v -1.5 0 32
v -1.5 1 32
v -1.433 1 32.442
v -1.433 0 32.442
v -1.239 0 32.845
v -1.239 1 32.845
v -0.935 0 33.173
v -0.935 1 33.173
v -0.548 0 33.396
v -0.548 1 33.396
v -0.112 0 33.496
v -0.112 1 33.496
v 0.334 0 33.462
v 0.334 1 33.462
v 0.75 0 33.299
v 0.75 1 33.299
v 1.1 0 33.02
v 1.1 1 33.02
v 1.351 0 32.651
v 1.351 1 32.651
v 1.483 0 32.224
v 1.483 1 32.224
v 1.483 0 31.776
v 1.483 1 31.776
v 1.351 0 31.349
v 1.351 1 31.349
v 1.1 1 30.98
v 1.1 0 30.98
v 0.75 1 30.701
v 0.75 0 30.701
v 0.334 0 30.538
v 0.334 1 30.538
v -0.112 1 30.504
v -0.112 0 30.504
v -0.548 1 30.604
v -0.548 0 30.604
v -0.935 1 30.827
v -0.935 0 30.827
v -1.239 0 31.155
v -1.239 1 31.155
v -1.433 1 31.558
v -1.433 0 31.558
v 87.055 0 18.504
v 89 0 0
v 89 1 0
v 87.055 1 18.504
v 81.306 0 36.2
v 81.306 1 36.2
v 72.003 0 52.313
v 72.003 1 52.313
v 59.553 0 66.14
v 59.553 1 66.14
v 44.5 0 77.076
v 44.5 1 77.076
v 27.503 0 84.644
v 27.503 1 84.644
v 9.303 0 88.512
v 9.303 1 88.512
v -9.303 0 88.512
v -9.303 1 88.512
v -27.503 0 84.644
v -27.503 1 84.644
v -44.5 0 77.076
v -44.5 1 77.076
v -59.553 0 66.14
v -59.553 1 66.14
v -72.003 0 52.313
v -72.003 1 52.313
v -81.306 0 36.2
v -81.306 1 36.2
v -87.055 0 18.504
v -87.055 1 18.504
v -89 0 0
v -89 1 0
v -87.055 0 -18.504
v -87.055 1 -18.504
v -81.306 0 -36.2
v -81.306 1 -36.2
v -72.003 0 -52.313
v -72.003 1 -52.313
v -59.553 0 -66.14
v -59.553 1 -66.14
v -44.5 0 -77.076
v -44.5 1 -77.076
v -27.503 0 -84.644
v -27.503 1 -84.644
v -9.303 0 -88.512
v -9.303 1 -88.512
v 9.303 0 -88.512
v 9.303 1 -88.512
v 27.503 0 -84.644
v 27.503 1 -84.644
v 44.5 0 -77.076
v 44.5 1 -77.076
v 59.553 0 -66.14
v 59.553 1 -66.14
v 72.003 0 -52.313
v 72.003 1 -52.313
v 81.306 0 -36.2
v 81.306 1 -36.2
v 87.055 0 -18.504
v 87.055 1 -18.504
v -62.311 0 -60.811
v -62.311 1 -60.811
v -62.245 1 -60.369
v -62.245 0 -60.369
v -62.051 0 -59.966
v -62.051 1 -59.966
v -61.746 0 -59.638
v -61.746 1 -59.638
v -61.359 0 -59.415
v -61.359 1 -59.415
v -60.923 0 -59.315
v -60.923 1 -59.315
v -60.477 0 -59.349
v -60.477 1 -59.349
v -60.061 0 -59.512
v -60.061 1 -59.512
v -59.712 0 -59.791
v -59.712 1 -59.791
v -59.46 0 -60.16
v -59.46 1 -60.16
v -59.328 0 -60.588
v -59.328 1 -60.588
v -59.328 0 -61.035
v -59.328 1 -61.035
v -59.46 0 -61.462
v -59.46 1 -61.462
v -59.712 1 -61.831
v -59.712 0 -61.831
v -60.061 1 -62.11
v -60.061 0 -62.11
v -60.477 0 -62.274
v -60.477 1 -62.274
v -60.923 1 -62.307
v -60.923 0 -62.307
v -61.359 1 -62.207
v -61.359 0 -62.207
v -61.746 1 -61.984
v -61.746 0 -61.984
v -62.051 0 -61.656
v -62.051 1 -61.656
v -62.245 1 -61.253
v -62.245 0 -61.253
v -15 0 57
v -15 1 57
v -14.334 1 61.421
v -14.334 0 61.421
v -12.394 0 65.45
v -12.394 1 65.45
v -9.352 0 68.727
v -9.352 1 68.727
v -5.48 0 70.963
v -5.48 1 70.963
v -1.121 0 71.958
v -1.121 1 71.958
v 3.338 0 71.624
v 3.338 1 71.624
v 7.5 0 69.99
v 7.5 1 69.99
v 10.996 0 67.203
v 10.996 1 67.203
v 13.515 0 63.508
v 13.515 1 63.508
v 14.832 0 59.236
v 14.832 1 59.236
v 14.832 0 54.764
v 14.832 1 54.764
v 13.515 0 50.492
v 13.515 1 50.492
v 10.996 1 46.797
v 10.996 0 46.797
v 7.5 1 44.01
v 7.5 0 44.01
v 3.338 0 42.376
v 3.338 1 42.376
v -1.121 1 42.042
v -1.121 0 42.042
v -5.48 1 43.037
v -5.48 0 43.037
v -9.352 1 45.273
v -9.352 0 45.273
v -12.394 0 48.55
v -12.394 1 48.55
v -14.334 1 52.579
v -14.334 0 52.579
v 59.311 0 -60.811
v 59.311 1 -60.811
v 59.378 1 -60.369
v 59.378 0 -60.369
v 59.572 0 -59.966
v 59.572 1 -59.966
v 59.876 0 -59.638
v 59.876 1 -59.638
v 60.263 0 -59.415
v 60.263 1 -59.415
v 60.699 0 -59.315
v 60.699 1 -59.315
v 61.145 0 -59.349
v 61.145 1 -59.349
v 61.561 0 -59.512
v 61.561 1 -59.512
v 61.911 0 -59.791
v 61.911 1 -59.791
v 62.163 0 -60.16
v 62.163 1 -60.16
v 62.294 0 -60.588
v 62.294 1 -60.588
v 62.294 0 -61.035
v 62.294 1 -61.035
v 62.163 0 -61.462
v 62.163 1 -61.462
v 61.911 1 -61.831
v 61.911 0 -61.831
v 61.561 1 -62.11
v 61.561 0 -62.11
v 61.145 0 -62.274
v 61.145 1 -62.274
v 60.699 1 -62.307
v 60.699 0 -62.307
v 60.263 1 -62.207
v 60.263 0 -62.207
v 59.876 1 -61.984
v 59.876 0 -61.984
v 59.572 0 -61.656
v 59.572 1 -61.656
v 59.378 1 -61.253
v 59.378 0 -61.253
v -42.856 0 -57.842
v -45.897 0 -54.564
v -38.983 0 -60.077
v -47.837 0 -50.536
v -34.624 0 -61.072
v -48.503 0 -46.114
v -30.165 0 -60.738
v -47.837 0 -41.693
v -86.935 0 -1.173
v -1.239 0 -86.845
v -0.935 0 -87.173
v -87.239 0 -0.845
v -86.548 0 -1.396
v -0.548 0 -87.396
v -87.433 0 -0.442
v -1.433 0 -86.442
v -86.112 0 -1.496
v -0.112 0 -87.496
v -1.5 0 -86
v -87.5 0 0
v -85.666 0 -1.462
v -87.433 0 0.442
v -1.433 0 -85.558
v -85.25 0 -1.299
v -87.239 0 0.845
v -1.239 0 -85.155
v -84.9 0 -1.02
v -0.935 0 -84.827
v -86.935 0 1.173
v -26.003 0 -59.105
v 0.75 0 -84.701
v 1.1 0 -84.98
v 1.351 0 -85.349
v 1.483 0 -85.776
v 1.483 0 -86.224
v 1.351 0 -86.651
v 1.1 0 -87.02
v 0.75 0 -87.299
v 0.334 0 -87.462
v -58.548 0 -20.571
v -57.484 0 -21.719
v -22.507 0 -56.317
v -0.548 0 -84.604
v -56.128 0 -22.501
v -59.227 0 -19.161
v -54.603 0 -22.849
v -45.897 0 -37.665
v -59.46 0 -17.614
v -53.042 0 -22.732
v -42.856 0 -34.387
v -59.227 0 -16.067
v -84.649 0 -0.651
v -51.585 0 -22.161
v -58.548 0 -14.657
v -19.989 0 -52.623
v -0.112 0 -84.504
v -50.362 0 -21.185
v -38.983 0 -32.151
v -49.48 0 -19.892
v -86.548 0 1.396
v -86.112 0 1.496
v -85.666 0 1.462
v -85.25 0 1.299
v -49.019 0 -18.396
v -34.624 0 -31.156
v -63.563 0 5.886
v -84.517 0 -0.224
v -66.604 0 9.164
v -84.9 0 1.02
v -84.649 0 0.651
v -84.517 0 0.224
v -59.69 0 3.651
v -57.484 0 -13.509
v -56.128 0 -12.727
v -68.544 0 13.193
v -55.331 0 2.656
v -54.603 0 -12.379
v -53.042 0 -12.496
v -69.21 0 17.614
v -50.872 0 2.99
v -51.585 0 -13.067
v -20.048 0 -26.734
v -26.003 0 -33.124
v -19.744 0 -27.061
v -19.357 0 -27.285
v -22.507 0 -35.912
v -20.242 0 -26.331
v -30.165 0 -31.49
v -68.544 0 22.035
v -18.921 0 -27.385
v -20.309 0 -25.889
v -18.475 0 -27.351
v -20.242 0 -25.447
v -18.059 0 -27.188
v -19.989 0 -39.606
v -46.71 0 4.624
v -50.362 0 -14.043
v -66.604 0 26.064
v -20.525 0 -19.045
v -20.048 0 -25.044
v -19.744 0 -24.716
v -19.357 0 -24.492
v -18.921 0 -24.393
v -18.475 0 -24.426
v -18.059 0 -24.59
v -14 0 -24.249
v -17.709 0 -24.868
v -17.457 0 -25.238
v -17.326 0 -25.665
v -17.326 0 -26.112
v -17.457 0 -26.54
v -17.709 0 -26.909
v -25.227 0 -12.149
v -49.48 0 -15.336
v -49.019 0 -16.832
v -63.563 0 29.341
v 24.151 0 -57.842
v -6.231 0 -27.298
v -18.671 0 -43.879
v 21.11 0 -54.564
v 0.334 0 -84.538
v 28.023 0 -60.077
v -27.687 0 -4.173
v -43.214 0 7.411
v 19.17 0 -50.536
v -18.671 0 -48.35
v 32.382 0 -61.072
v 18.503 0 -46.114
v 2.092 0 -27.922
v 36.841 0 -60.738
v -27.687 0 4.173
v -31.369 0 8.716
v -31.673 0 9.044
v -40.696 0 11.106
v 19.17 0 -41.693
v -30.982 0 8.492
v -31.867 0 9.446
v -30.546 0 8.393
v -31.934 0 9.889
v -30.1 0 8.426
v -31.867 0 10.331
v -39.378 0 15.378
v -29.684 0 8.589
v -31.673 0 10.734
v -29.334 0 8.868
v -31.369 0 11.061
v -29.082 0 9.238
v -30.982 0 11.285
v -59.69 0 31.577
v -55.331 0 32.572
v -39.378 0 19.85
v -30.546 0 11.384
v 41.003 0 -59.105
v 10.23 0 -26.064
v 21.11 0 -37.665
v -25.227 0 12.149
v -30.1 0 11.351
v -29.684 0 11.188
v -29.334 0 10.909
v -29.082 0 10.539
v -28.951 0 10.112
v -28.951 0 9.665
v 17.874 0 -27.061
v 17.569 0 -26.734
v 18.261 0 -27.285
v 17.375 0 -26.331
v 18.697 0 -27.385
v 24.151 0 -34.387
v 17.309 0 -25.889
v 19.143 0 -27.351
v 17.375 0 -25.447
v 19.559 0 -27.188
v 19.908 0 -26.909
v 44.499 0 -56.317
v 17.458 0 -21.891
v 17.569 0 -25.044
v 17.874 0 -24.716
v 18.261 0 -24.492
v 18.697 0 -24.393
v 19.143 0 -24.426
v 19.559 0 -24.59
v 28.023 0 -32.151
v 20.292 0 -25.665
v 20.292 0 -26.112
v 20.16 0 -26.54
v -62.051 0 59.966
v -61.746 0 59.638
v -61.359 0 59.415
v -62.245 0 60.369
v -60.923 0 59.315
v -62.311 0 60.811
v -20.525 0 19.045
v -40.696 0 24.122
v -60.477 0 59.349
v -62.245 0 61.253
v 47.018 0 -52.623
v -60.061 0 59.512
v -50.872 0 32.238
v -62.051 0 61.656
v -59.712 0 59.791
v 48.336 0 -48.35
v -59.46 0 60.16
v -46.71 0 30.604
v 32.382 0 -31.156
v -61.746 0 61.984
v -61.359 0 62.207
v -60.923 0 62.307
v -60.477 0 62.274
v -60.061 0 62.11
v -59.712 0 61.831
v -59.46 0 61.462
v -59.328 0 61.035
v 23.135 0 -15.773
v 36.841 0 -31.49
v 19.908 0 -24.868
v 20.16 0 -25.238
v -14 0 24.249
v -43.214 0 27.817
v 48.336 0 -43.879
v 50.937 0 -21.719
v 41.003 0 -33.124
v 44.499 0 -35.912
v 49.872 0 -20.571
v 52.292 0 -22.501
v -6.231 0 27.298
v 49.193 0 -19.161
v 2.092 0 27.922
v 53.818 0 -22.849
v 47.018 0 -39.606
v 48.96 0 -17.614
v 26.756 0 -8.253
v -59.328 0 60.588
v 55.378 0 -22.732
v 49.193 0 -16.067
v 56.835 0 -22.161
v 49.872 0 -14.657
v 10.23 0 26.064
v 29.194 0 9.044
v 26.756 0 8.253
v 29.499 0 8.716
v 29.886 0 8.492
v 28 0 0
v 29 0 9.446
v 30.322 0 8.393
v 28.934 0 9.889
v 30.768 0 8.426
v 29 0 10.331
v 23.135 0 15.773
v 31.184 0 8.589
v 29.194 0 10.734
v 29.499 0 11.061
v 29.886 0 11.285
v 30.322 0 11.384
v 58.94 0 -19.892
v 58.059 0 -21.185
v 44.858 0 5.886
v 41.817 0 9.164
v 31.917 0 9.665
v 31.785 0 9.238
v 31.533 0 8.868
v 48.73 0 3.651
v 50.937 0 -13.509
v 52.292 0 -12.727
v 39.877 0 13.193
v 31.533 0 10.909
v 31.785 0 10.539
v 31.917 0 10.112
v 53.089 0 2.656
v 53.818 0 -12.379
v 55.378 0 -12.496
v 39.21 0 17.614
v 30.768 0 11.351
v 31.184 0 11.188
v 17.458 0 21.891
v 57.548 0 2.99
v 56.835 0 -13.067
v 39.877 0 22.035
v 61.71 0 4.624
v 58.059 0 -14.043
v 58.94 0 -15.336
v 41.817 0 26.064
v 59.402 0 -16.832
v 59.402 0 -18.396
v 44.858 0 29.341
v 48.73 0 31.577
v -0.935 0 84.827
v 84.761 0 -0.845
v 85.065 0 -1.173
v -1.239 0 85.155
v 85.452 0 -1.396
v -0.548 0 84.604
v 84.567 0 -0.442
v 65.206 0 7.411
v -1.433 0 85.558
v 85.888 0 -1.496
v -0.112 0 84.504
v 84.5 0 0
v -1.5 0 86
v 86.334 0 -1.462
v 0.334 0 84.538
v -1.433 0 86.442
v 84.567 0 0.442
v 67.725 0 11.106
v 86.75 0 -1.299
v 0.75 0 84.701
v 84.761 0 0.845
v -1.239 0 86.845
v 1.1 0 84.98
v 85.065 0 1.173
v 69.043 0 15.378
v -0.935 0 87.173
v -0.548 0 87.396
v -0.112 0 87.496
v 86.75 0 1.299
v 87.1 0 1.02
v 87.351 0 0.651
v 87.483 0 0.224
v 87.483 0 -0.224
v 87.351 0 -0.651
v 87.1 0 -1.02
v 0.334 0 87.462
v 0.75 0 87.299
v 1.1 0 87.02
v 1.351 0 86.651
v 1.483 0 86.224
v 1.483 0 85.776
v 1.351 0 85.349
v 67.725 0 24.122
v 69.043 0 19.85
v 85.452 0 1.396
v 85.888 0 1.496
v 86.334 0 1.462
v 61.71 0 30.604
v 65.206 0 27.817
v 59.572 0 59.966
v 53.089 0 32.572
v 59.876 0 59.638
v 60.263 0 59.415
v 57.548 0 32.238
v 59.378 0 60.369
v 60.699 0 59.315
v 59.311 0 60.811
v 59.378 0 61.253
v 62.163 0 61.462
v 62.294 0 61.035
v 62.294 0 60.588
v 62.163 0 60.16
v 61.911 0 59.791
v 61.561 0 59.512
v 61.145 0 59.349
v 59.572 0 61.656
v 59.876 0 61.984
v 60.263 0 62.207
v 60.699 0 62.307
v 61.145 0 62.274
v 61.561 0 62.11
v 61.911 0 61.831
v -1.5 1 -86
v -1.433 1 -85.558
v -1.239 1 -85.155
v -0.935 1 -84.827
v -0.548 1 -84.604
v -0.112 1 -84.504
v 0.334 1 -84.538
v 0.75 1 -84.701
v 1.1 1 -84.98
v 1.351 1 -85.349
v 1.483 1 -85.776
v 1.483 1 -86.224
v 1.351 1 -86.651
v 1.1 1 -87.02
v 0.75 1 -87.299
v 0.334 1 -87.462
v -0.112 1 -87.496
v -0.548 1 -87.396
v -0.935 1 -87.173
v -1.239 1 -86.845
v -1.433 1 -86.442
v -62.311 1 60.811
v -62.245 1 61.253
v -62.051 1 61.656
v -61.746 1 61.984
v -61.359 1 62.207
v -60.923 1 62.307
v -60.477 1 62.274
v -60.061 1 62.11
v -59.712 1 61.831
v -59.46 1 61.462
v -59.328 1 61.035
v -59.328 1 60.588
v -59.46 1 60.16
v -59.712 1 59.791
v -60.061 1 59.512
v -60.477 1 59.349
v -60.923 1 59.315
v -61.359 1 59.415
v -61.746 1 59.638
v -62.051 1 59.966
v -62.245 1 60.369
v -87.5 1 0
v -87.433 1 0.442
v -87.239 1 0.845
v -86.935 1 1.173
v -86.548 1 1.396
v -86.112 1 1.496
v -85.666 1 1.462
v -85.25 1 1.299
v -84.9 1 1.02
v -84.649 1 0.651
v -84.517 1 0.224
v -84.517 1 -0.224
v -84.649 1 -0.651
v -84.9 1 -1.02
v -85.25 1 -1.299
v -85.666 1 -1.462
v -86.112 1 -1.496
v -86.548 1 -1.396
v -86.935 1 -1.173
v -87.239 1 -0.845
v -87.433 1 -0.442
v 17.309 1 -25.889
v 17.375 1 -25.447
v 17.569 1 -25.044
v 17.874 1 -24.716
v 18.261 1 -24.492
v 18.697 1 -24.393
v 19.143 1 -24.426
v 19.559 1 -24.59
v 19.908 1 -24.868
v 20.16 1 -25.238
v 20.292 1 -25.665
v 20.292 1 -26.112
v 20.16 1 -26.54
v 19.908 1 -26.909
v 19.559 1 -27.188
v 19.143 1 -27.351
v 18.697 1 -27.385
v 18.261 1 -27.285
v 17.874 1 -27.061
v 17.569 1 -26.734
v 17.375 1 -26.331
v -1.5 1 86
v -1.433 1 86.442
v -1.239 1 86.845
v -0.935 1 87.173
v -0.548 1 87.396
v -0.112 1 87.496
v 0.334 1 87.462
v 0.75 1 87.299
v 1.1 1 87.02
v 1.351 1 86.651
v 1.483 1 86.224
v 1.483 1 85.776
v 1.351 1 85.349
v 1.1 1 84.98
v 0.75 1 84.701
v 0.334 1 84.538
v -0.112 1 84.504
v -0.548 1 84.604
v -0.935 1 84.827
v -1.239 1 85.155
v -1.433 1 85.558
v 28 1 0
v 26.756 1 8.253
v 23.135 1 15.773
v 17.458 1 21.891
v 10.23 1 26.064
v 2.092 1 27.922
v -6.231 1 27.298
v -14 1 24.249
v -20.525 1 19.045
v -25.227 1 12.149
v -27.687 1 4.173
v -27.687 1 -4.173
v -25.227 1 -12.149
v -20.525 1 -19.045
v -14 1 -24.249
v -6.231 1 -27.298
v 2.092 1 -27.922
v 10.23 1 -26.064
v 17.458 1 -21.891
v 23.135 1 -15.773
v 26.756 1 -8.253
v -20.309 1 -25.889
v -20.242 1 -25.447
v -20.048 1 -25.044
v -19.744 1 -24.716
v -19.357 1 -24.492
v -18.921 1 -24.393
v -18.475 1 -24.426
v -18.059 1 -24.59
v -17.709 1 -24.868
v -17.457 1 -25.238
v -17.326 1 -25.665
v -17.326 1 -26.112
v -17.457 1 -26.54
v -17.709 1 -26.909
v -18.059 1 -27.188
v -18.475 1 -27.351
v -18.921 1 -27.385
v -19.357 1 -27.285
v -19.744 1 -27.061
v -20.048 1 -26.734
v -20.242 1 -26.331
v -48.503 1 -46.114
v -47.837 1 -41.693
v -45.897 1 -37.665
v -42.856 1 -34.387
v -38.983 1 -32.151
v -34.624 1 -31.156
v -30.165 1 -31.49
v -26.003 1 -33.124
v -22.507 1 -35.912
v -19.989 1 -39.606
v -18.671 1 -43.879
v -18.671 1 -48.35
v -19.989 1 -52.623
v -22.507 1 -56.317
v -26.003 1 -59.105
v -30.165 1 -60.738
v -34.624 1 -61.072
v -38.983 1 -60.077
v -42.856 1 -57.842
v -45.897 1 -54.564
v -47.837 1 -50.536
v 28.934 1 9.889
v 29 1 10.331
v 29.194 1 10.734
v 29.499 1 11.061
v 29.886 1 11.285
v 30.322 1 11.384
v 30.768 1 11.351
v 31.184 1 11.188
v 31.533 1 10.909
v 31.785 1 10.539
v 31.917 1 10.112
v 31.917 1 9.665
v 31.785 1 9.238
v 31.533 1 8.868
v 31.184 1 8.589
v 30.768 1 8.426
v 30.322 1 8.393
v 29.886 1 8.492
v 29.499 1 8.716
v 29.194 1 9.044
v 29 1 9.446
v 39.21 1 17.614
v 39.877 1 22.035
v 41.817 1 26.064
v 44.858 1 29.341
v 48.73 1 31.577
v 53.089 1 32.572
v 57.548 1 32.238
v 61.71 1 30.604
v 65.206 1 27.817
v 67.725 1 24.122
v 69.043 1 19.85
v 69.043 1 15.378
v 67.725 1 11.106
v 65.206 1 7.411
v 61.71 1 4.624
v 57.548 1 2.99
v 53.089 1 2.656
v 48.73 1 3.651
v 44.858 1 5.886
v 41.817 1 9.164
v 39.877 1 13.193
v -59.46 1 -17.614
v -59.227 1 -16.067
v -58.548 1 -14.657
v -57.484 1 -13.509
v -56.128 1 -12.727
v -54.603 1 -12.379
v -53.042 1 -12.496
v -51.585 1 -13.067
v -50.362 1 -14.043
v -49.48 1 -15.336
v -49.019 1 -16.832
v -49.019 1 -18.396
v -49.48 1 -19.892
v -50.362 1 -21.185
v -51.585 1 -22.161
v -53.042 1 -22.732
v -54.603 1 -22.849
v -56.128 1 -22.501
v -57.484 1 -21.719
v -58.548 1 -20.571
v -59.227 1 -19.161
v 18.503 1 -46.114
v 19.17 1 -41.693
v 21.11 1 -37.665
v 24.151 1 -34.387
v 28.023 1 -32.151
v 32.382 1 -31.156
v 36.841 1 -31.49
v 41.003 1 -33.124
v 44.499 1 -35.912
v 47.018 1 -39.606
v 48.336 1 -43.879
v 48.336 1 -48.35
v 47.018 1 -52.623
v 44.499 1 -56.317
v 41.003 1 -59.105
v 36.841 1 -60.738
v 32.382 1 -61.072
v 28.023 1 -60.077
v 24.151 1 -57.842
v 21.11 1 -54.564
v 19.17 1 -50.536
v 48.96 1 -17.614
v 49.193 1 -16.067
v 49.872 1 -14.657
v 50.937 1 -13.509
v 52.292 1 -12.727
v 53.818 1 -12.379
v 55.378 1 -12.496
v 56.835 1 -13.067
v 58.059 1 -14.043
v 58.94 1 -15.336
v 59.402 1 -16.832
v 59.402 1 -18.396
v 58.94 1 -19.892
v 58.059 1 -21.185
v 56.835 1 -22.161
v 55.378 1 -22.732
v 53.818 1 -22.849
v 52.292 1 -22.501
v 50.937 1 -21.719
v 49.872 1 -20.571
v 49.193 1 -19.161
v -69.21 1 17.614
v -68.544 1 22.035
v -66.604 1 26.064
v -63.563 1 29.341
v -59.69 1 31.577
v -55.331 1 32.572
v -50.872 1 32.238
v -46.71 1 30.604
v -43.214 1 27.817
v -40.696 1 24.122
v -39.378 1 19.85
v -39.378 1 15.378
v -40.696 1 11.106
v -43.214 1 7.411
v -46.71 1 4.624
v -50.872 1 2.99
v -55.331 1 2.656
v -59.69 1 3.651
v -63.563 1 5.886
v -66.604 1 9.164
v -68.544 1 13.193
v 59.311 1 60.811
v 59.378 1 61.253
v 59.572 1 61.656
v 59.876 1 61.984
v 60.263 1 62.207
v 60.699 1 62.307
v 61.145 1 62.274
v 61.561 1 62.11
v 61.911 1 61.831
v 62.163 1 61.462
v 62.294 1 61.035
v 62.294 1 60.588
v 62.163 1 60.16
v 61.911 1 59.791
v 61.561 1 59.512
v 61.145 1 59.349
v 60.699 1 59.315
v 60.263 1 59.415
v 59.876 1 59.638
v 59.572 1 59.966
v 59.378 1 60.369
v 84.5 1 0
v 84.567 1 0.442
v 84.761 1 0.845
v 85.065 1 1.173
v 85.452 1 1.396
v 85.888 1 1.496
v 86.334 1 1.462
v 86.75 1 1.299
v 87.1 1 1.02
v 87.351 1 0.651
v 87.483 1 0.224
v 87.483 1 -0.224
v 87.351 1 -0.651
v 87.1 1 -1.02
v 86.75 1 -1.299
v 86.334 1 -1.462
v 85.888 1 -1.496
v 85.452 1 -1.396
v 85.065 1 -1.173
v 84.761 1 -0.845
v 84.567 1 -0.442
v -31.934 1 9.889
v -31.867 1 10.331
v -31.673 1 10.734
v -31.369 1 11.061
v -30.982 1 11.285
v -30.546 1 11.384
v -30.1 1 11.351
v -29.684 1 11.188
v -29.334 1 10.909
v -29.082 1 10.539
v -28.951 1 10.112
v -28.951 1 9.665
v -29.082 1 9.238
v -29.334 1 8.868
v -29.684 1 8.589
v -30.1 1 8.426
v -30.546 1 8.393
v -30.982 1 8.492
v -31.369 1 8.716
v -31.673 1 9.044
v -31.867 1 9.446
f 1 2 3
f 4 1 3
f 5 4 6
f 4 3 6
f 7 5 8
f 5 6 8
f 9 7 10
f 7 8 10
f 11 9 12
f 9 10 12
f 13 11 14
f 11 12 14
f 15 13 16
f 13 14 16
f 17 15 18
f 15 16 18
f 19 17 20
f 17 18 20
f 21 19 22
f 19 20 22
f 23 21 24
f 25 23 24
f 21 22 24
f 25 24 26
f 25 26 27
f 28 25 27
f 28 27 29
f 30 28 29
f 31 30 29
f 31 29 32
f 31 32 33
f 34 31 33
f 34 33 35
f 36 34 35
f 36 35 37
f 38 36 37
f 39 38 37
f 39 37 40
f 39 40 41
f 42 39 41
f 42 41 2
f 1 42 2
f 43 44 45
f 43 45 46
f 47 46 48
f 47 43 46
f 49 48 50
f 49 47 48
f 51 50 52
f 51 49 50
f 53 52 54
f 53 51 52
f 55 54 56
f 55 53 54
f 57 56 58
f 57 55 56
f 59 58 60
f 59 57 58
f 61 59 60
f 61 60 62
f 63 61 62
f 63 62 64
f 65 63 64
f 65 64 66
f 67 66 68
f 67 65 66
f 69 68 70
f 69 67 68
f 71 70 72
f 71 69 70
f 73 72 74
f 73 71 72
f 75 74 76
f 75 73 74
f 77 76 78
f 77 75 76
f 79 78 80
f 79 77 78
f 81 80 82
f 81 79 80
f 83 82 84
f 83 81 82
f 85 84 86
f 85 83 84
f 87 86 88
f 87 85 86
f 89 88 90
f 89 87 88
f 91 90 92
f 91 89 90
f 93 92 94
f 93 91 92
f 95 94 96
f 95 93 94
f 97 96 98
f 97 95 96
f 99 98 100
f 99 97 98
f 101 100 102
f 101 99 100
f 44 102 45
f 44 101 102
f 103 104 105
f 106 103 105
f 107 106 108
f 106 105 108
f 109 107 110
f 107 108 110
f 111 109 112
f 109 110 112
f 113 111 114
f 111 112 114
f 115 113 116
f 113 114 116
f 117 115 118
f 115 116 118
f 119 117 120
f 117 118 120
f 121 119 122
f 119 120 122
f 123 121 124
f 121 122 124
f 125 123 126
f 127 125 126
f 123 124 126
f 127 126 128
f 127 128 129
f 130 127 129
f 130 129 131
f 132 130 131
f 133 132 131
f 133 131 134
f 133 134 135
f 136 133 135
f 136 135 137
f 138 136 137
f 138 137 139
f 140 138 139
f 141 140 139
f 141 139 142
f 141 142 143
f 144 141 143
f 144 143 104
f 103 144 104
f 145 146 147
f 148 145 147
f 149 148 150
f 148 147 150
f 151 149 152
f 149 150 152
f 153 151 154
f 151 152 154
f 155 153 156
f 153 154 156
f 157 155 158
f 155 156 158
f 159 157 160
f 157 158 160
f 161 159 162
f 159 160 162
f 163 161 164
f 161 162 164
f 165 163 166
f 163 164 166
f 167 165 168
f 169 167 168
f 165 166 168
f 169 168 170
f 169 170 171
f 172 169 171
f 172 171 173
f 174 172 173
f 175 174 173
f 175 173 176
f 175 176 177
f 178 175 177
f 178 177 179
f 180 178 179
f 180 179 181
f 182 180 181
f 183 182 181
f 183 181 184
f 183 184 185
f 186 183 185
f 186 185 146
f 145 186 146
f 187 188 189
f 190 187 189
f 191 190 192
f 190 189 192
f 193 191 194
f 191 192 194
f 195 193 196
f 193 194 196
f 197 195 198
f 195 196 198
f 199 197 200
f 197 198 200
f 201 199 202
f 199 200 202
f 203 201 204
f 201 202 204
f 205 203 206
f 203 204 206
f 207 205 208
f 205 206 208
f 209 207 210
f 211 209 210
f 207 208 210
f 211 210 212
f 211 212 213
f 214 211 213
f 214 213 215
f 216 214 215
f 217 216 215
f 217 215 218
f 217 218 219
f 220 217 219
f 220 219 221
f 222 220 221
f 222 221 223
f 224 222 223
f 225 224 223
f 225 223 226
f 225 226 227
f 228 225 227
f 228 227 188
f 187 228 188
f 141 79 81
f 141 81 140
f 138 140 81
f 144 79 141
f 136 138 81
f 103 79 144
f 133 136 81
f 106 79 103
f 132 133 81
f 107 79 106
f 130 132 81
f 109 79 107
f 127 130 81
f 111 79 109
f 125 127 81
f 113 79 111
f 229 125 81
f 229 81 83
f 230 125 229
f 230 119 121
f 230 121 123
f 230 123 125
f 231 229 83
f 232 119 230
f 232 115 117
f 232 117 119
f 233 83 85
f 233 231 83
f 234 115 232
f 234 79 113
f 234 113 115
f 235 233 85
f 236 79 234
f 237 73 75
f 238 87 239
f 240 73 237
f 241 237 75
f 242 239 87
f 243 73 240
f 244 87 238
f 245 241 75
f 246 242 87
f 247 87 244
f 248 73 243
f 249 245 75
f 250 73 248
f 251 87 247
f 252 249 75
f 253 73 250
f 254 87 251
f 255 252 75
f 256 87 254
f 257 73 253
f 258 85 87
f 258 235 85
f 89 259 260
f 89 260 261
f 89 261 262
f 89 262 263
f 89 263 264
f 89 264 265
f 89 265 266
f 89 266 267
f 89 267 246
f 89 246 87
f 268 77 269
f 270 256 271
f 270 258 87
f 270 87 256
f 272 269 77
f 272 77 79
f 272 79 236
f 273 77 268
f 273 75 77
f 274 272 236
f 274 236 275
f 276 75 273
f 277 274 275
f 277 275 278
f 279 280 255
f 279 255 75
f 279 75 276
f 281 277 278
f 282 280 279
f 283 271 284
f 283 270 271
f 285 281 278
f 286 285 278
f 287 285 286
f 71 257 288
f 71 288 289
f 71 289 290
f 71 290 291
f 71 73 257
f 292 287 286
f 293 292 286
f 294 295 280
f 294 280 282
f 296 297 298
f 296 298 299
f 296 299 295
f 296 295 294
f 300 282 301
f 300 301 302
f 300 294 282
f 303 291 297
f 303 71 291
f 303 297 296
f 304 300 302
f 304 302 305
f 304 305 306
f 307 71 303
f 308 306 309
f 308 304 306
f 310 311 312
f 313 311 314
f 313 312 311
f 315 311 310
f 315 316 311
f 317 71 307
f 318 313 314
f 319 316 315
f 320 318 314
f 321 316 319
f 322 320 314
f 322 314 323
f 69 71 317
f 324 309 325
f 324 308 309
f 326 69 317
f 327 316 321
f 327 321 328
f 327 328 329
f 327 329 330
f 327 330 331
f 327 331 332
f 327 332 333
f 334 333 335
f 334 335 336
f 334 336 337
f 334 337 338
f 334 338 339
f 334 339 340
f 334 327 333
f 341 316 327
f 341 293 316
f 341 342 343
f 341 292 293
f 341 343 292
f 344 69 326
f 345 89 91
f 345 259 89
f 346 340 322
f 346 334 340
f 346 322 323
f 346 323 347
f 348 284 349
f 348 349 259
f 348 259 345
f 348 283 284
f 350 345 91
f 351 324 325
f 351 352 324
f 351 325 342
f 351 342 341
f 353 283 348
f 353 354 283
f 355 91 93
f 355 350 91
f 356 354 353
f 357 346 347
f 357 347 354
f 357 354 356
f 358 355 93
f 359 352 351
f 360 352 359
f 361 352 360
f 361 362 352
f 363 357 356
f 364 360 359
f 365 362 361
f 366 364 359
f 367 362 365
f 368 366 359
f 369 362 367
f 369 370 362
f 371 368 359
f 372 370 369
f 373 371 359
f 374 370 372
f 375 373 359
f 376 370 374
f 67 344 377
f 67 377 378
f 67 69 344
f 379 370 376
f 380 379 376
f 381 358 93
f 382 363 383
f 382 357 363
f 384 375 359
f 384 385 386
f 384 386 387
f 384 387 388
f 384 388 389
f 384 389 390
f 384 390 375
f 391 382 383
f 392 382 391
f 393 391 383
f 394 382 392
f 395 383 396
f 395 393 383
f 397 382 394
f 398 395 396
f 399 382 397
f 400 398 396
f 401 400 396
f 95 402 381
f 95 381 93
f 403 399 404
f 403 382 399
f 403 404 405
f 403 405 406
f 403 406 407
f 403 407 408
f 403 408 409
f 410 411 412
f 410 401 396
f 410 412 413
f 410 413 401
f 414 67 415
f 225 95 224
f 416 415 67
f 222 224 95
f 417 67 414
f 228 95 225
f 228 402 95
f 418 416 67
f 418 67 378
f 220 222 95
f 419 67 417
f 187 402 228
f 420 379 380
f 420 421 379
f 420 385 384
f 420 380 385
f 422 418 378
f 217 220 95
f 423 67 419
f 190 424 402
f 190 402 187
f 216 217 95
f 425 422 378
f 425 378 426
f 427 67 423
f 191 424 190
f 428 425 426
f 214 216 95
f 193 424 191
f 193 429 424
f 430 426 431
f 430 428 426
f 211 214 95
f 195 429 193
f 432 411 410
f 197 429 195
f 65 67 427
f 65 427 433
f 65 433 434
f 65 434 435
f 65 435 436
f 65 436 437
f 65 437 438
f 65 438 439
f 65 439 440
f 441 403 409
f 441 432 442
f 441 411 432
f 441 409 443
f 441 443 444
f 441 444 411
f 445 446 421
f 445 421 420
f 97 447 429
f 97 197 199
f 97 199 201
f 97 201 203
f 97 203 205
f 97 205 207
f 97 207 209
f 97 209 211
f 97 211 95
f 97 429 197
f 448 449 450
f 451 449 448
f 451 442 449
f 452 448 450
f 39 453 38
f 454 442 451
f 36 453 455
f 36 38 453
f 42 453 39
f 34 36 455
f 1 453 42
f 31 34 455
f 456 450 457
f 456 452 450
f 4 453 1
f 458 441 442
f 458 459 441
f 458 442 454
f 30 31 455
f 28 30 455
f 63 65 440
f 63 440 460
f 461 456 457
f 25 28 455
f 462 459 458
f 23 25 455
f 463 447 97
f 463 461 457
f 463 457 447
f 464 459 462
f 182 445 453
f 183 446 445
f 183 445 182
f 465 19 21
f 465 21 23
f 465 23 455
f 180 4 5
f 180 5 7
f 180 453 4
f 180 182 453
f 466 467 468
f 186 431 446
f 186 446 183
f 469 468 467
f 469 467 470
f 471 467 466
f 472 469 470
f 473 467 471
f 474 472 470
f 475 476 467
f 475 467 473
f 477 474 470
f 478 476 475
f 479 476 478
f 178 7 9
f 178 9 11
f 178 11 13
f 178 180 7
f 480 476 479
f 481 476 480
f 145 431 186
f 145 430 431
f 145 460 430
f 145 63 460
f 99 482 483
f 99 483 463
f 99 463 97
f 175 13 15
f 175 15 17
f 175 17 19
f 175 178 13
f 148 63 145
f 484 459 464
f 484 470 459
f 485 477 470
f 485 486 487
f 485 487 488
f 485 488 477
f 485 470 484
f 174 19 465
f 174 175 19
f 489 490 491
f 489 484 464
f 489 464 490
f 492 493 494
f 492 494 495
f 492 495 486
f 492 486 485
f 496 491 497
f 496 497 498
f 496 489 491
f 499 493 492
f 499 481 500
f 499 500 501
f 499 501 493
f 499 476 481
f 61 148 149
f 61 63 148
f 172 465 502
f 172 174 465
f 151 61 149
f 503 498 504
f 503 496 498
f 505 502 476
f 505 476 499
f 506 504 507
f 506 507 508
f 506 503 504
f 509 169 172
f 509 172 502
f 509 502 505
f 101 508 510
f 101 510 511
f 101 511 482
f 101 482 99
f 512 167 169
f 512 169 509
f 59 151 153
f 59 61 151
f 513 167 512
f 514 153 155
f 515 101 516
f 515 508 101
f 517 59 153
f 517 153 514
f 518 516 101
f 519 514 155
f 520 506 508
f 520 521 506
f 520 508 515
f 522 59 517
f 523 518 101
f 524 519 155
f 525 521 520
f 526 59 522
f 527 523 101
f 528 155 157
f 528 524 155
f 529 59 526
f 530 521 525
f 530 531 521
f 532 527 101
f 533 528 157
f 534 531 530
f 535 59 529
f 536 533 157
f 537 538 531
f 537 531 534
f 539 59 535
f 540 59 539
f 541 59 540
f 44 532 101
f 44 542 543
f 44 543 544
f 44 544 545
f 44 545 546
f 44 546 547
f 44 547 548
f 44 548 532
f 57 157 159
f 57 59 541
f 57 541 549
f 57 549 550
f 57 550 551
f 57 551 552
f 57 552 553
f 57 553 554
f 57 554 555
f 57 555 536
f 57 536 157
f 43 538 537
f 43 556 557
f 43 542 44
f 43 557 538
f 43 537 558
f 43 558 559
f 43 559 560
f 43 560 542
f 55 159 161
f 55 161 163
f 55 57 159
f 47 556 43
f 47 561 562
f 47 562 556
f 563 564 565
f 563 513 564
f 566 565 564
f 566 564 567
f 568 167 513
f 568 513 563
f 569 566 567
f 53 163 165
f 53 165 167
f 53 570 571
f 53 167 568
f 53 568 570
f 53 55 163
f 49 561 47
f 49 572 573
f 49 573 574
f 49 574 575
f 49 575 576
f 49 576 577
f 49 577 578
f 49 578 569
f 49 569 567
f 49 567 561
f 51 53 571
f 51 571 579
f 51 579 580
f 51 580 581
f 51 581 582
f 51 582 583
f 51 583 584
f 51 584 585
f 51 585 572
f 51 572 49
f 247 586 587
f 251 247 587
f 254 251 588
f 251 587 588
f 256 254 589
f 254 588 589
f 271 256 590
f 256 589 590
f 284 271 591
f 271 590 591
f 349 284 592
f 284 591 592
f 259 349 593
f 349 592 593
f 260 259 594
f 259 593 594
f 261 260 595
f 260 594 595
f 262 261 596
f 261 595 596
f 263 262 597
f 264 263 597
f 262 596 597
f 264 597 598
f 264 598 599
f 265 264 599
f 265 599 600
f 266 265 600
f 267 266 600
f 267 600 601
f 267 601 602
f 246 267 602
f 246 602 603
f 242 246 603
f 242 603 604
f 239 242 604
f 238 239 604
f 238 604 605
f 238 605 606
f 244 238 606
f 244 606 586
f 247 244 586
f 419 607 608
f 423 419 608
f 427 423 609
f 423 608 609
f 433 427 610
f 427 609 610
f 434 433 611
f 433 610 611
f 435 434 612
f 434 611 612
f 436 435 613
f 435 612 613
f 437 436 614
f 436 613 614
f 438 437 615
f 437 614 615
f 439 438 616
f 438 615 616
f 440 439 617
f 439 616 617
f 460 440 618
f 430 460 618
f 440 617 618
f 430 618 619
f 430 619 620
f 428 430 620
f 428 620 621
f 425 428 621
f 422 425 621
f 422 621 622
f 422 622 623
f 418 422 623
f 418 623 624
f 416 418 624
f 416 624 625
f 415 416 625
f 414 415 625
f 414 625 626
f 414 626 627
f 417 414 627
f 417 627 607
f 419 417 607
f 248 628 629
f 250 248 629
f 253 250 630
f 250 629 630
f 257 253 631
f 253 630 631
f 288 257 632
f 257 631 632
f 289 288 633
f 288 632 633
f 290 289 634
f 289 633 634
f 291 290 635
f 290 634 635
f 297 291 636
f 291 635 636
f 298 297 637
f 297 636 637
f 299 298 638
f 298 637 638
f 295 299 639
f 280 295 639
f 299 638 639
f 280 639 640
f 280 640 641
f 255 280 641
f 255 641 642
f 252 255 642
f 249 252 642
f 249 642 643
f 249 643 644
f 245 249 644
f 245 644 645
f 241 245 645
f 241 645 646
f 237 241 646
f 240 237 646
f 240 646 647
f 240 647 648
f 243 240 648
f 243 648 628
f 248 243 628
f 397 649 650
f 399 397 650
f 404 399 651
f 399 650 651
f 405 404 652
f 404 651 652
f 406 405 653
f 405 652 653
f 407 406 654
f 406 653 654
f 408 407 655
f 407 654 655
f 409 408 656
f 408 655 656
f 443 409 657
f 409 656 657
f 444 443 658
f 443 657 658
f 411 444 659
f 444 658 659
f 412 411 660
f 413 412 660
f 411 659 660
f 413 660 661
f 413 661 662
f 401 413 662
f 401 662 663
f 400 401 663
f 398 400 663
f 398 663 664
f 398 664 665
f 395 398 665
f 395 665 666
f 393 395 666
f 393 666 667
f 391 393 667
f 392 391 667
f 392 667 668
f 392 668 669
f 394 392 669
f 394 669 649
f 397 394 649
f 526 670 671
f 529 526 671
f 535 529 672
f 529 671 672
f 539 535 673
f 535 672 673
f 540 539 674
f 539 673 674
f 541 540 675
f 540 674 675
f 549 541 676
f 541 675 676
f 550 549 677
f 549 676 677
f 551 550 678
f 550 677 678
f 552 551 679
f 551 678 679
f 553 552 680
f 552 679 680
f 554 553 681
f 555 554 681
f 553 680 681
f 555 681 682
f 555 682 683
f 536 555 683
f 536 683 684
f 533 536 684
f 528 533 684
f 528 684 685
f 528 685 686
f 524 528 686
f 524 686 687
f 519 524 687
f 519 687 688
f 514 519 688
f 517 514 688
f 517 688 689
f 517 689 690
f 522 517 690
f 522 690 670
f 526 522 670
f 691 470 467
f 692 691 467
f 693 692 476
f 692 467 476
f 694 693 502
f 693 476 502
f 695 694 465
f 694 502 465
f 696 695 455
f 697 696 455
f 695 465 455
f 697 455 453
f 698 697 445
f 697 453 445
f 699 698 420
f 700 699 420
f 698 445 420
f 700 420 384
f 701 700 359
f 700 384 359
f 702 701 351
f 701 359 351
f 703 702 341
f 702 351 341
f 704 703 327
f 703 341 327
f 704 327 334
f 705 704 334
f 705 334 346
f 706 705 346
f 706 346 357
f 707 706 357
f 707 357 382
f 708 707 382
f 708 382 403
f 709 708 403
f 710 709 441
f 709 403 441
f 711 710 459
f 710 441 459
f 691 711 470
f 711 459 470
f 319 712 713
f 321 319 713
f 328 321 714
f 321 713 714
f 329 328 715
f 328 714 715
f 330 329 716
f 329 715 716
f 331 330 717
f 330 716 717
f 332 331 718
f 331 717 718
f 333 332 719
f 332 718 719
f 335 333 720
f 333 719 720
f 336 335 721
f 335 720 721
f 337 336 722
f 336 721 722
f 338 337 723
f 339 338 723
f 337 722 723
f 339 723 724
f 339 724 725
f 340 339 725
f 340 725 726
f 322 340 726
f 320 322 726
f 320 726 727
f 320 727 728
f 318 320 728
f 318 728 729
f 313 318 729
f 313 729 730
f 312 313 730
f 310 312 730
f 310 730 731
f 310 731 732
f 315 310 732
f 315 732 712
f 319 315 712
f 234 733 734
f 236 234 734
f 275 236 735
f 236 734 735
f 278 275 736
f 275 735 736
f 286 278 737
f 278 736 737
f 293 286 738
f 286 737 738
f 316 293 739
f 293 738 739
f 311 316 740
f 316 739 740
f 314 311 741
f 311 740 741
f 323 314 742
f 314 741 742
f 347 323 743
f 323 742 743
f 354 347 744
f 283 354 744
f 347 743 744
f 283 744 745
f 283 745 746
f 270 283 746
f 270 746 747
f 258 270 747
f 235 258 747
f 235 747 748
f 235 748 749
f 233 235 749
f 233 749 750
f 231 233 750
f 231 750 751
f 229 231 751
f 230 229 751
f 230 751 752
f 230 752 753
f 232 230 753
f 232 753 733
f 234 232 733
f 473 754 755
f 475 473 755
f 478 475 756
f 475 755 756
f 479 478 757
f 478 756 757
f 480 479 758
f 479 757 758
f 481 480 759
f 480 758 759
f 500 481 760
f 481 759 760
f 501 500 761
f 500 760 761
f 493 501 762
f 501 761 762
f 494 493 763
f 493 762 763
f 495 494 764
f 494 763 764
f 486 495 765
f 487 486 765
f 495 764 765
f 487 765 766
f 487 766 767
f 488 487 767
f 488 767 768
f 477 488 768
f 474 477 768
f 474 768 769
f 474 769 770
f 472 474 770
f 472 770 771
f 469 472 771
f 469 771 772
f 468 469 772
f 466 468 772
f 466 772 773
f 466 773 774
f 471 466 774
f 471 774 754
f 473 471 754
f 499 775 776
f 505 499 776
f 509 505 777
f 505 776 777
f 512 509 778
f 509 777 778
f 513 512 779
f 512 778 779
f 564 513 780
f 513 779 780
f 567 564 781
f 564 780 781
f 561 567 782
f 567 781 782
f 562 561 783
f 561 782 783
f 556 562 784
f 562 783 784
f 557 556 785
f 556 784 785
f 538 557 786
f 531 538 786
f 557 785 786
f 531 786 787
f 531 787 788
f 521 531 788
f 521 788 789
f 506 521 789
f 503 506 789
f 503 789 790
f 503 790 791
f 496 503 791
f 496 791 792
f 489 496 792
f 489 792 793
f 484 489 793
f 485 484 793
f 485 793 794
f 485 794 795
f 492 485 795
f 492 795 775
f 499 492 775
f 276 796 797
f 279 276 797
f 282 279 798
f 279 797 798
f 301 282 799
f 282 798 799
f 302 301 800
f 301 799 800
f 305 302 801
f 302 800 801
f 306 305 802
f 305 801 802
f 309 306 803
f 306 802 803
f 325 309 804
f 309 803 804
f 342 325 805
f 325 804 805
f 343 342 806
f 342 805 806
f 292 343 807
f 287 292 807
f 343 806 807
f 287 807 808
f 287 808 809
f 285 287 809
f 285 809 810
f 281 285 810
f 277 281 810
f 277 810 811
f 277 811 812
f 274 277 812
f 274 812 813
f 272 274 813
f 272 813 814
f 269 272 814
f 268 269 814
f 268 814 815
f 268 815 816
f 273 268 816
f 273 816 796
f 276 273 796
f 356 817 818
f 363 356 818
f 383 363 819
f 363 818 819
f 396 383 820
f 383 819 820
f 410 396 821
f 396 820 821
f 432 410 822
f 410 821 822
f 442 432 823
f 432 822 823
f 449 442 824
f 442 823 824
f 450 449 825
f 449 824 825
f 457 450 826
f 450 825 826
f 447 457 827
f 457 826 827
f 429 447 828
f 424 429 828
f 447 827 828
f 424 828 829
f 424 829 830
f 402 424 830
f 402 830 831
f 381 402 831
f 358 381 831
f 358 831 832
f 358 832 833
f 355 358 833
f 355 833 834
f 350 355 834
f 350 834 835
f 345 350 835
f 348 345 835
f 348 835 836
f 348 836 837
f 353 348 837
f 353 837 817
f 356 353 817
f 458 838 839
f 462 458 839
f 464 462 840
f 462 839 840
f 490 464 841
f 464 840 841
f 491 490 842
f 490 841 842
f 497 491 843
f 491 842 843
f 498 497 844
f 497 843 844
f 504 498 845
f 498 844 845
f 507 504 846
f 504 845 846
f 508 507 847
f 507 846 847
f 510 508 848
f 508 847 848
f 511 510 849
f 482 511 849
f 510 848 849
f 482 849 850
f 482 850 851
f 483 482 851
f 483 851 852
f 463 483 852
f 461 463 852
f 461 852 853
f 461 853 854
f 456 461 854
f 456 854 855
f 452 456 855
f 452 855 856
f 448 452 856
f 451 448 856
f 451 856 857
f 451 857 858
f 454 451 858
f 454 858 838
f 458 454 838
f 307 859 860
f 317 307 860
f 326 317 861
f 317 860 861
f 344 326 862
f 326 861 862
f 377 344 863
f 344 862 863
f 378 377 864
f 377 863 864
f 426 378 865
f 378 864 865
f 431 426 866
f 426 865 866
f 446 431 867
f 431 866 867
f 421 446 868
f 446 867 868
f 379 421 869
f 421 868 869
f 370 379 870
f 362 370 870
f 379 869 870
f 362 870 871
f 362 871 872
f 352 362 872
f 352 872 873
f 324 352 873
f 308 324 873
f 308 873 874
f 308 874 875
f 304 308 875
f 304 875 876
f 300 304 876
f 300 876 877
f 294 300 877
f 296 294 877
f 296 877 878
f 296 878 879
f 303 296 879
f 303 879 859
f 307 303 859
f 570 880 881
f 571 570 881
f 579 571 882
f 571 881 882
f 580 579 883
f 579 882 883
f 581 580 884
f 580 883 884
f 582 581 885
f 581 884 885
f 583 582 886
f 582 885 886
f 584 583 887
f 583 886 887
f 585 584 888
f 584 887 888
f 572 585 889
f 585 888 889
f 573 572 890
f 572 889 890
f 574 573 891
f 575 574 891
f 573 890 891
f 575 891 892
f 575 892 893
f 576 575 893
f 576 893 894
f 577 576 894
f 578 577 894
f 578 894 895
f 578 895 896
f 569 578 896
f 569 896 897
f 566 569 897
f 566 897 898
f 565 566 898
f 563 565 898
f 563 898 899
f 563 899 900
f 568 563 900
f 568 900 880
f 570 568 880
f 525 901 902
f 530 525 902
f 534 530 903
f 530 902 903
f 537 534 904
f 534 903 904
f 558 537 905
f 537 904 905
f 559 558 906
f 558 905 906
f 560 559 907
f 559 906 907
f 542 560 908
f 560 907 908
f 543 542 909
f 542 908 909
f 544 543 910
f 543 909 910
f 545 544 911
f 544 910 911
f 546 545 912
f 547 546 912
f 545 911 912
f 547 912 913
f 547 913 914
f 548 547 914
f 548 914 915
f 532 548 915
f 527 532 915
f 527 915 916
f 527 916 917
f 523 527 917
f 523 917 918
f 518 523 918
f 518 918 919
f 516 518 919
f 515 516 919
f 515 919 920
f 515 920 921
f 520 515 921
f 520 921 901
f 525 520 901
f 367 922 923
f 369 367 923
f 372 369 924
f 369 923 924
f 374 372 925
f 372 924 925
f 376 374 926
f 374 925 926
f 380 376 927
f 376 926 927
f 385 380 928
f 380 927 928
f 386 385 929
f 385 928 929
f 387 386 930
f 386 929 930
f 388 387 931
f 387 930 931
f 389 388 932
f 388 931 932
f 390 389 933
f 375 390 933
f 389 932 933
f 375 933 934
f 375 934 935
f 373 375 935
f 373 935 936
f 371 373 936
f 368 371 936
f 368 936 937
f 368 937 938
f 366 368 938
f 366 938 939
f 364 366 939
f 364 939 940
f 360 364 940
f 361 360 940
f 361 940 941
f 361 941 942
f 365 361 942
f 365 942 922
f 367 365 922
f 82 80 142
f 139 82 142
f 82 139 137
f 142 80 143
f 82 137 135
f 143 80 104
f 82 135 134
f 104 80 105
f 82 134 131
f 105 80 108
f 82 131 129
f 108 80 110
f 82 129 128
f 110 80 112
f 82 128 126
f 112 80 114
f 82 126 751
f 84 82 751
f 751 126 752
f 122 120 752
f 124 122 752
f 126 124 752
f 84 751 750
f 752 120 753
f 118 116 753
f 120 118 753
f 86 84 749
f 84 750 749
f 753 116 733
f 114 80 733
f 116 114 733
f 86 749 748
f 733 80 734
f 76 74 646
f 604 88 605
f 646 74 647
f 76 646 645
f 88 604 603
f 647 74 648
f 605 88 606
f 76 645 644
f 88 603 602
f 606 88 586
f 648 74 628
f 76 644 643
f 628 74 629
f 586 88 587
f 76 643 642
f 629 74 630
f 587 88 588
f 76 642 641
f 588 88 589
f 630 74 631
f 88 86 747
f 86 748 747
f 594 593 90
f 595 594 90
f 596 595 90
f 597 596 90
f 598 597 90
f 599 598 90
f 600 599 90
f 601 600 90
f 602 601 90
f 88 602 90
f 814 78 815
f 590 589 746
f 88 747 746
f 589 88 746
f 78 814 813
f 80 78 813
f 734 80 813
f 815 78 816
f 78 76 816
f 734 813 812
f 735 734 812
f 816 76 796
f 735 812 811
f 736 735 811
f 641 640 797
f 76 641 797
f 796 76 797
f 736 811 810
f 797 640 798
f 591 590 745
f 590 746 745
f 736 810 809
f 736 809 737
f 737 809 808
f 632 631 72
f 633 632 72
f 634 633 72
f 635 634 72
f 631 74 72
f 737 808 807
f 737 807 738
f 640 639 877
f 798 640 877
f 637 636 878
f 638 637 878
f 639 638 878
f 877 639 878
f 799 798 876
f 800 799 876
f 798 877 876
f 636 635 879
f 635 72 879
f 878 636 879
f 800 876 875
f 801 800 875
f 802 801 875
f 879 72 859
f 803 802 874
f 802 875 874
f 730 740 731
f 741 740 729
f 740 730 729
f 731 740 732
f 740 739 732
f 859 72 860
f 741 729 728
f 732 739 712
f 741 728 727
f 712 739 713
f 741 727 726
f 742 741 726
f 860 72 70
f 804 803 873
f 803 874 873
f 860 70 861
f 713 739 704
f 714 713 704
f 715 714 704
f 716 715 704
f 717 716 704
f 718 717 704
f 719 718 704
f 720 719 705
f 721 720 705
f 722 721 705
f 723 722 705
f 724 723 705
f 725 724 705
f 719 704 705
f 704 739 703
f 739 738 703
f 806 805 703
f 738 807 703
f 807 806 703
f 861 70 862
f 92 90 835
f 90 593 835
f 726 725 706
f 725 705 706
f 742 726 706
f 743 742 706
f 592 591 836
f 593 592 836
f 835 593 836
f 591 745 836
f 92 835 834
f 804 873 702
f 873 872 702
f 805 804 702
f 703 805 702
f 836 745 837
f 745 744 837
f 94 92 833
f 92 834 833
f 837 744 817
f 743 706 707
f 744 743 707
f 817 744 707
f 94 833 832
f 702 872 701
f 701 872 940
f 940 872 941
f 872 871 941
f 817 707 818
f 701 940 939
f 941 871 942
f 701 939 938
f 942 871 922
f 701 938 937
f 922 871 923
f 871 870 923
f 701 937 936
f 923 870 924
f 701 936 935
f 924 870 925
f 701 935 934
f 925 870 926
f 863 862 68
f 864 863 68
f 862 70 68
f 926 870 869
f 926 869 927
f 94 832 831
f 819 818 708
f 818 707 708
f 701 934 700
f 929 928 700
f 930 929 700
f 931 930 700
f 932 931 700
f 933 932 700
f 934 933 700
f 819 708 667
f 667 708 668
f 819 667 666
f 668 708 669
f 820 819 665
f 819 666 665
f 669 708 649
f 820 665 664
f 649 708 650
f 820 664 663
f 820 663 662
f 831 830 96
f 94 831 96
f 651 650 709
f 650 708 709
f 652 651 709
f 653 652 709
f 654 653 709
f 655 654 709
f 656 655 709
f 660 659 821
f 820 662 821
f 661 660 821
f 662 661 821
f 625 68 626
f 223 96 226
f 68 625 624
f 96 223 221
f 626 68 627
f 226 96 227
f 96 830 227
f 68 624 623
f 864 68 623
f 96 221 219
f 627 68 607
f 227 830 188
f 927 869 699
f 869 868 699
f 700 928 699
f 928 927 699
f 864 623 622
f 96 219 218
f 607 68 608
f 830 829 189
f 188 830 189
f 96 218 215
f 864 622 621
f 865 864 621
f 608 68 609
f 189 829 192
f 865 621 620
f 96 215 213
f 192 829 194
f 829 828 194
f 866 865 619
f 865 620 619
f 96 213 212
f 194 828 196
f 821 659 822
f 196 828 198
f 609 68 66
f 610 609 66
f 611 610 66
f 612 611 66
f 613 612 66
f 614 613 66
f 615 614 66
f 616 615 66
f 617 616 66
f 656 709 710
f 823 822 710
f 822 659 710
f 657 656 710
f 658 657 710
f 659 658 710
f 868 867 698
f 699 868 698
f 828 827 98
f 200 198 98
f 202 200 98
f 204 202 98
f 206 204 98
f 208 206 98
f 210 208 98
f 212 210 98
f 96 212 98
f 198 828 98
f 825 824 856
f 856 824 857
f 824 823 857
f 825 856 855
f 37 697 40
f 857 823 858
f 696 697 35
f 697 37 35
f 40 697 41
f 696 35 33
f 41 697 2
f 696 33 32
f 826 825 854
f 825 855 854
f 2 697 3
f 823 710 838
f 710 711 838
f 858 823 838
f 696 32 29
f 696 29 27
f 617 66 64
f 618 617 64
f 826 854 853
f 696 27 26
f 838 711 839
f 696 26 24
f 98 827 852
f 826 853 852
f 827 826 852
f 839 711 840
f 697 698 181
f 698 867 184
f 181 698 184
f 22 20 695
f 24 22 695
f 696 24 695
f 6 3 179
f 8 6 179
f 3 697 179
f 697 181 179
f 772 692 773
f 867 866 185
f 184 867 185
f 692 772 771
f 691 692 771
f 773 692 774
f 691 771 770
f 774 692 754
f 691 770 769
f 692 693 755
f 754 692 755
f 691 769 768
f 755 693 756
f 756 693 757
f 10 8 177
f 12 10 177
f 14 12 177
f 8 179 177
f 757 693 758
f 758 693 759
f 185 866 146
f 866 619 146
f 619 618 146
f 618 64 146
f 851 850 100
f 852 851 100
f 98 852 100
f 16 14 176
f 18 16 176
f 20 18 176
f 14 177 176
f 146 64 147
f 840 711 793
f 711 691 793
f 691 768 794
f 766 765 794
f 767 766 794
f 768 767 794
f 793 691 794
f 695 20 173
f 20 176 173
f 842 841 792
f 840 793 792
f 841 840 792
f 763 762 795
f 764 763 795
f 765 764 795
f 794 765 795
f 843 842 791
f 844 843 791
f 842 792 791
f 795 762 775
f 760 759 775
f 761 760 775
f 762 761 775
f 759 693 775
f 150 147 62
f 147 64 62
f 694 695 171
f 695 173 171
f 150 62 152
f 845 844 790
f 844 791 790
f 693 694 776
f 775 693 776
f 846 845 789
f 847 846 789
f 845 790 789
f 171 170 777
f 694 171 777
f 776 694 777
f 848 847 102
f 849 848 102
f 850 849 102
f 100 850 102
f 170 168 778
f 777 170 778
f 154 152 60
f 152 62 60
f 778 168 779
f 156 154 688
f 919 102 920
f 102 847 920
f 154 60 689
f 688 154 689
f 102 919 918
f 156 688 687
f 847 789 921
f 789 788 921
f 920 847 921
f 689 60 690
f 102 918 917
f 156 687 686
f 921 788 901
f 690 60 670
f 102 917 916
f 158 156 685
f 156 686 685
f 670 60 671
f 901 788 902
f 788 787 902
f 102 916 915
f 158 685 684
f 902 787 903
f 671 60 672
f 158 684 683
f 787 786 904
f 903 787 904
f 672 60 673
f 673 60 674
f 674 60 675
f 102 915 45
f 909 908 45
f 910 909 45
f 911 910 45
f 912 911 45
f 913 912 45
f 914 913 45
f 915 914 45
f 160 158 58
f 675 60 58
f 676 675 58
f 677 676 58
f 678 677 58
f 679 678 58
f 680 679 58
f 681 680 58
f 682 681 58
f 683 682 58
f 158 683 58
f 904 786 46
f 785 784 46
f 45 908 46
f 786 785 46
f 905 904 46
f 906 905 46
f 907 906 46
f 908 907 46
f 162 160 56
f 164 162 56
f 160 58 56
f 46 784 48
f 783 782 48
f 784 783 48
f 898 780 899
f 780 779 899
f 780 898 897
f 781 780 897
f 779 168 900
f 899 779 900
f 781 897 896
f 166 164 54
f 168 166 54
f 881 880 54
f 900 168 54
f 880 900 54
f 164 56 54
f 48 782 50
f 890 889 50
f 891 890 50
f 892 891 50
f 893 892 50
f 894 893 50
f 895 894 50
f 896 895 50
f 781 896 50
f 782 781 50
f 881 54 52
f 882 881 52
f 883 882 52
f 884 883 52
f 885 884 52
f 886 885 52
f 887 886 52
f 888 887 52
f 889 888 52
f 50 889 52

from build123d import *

# Parameters (mm, degrees)
F0_R     = 89
F0_R_2   = 28
F1_DEPTH = 1
F2_D     = 10.5
F3_D     = 30
F4_D     = 3
F6_D     = 3


with BuildPart() as f1:
    # F0 (on Front) → F1 (new body)
    with BuildSketch(Plane.XZ):
        Circle(F0_R)
        Circle(F0_R_2, mode=Mode.SUBTRACT)
    extrude(amount=-F1_DEPTH)

    # F2 (through all)
    with Locations(Plane.XZ):
        with Locations((-54.2102163981, -17.6139841623), (54.2102163981, -17.6139841623)):
            Hole(F2_D / 2)

    # F3 (through all)
    with Locations(Plane.XZ):
        with Locations((-54.2102264595, 17.6139531965), (0, 57), (54.2102264595, 17.6139531965), (33.5032664595, -46.1143268035), (-33.5032664595, -46.1143268035)):
            Hole(F3_D / 2)

    # F4 (through all)
    with Locations(Plane.XZ):
        with Locations((-30.4338113457, 9.8885351278), (0, 32), (30.4338113457, 9.8885351278), (18.8088513457, -25.8887448722), (-18.8088513457, -25.8887448722)):
            Hole(F4_D / 2)

    # F6 (through all)
    with Locations(Plane.XZ):
        with Locations((-60.811183182, 60.811183182), (0, 86), (60.811183182, 60.811183182), (86, 0), (60.811183182, -60.811183182), (0, -86), (-60.811183182, -60.811183182), (-86, 0)):
            Hole(F6_D / 2)


solid = f1.part
